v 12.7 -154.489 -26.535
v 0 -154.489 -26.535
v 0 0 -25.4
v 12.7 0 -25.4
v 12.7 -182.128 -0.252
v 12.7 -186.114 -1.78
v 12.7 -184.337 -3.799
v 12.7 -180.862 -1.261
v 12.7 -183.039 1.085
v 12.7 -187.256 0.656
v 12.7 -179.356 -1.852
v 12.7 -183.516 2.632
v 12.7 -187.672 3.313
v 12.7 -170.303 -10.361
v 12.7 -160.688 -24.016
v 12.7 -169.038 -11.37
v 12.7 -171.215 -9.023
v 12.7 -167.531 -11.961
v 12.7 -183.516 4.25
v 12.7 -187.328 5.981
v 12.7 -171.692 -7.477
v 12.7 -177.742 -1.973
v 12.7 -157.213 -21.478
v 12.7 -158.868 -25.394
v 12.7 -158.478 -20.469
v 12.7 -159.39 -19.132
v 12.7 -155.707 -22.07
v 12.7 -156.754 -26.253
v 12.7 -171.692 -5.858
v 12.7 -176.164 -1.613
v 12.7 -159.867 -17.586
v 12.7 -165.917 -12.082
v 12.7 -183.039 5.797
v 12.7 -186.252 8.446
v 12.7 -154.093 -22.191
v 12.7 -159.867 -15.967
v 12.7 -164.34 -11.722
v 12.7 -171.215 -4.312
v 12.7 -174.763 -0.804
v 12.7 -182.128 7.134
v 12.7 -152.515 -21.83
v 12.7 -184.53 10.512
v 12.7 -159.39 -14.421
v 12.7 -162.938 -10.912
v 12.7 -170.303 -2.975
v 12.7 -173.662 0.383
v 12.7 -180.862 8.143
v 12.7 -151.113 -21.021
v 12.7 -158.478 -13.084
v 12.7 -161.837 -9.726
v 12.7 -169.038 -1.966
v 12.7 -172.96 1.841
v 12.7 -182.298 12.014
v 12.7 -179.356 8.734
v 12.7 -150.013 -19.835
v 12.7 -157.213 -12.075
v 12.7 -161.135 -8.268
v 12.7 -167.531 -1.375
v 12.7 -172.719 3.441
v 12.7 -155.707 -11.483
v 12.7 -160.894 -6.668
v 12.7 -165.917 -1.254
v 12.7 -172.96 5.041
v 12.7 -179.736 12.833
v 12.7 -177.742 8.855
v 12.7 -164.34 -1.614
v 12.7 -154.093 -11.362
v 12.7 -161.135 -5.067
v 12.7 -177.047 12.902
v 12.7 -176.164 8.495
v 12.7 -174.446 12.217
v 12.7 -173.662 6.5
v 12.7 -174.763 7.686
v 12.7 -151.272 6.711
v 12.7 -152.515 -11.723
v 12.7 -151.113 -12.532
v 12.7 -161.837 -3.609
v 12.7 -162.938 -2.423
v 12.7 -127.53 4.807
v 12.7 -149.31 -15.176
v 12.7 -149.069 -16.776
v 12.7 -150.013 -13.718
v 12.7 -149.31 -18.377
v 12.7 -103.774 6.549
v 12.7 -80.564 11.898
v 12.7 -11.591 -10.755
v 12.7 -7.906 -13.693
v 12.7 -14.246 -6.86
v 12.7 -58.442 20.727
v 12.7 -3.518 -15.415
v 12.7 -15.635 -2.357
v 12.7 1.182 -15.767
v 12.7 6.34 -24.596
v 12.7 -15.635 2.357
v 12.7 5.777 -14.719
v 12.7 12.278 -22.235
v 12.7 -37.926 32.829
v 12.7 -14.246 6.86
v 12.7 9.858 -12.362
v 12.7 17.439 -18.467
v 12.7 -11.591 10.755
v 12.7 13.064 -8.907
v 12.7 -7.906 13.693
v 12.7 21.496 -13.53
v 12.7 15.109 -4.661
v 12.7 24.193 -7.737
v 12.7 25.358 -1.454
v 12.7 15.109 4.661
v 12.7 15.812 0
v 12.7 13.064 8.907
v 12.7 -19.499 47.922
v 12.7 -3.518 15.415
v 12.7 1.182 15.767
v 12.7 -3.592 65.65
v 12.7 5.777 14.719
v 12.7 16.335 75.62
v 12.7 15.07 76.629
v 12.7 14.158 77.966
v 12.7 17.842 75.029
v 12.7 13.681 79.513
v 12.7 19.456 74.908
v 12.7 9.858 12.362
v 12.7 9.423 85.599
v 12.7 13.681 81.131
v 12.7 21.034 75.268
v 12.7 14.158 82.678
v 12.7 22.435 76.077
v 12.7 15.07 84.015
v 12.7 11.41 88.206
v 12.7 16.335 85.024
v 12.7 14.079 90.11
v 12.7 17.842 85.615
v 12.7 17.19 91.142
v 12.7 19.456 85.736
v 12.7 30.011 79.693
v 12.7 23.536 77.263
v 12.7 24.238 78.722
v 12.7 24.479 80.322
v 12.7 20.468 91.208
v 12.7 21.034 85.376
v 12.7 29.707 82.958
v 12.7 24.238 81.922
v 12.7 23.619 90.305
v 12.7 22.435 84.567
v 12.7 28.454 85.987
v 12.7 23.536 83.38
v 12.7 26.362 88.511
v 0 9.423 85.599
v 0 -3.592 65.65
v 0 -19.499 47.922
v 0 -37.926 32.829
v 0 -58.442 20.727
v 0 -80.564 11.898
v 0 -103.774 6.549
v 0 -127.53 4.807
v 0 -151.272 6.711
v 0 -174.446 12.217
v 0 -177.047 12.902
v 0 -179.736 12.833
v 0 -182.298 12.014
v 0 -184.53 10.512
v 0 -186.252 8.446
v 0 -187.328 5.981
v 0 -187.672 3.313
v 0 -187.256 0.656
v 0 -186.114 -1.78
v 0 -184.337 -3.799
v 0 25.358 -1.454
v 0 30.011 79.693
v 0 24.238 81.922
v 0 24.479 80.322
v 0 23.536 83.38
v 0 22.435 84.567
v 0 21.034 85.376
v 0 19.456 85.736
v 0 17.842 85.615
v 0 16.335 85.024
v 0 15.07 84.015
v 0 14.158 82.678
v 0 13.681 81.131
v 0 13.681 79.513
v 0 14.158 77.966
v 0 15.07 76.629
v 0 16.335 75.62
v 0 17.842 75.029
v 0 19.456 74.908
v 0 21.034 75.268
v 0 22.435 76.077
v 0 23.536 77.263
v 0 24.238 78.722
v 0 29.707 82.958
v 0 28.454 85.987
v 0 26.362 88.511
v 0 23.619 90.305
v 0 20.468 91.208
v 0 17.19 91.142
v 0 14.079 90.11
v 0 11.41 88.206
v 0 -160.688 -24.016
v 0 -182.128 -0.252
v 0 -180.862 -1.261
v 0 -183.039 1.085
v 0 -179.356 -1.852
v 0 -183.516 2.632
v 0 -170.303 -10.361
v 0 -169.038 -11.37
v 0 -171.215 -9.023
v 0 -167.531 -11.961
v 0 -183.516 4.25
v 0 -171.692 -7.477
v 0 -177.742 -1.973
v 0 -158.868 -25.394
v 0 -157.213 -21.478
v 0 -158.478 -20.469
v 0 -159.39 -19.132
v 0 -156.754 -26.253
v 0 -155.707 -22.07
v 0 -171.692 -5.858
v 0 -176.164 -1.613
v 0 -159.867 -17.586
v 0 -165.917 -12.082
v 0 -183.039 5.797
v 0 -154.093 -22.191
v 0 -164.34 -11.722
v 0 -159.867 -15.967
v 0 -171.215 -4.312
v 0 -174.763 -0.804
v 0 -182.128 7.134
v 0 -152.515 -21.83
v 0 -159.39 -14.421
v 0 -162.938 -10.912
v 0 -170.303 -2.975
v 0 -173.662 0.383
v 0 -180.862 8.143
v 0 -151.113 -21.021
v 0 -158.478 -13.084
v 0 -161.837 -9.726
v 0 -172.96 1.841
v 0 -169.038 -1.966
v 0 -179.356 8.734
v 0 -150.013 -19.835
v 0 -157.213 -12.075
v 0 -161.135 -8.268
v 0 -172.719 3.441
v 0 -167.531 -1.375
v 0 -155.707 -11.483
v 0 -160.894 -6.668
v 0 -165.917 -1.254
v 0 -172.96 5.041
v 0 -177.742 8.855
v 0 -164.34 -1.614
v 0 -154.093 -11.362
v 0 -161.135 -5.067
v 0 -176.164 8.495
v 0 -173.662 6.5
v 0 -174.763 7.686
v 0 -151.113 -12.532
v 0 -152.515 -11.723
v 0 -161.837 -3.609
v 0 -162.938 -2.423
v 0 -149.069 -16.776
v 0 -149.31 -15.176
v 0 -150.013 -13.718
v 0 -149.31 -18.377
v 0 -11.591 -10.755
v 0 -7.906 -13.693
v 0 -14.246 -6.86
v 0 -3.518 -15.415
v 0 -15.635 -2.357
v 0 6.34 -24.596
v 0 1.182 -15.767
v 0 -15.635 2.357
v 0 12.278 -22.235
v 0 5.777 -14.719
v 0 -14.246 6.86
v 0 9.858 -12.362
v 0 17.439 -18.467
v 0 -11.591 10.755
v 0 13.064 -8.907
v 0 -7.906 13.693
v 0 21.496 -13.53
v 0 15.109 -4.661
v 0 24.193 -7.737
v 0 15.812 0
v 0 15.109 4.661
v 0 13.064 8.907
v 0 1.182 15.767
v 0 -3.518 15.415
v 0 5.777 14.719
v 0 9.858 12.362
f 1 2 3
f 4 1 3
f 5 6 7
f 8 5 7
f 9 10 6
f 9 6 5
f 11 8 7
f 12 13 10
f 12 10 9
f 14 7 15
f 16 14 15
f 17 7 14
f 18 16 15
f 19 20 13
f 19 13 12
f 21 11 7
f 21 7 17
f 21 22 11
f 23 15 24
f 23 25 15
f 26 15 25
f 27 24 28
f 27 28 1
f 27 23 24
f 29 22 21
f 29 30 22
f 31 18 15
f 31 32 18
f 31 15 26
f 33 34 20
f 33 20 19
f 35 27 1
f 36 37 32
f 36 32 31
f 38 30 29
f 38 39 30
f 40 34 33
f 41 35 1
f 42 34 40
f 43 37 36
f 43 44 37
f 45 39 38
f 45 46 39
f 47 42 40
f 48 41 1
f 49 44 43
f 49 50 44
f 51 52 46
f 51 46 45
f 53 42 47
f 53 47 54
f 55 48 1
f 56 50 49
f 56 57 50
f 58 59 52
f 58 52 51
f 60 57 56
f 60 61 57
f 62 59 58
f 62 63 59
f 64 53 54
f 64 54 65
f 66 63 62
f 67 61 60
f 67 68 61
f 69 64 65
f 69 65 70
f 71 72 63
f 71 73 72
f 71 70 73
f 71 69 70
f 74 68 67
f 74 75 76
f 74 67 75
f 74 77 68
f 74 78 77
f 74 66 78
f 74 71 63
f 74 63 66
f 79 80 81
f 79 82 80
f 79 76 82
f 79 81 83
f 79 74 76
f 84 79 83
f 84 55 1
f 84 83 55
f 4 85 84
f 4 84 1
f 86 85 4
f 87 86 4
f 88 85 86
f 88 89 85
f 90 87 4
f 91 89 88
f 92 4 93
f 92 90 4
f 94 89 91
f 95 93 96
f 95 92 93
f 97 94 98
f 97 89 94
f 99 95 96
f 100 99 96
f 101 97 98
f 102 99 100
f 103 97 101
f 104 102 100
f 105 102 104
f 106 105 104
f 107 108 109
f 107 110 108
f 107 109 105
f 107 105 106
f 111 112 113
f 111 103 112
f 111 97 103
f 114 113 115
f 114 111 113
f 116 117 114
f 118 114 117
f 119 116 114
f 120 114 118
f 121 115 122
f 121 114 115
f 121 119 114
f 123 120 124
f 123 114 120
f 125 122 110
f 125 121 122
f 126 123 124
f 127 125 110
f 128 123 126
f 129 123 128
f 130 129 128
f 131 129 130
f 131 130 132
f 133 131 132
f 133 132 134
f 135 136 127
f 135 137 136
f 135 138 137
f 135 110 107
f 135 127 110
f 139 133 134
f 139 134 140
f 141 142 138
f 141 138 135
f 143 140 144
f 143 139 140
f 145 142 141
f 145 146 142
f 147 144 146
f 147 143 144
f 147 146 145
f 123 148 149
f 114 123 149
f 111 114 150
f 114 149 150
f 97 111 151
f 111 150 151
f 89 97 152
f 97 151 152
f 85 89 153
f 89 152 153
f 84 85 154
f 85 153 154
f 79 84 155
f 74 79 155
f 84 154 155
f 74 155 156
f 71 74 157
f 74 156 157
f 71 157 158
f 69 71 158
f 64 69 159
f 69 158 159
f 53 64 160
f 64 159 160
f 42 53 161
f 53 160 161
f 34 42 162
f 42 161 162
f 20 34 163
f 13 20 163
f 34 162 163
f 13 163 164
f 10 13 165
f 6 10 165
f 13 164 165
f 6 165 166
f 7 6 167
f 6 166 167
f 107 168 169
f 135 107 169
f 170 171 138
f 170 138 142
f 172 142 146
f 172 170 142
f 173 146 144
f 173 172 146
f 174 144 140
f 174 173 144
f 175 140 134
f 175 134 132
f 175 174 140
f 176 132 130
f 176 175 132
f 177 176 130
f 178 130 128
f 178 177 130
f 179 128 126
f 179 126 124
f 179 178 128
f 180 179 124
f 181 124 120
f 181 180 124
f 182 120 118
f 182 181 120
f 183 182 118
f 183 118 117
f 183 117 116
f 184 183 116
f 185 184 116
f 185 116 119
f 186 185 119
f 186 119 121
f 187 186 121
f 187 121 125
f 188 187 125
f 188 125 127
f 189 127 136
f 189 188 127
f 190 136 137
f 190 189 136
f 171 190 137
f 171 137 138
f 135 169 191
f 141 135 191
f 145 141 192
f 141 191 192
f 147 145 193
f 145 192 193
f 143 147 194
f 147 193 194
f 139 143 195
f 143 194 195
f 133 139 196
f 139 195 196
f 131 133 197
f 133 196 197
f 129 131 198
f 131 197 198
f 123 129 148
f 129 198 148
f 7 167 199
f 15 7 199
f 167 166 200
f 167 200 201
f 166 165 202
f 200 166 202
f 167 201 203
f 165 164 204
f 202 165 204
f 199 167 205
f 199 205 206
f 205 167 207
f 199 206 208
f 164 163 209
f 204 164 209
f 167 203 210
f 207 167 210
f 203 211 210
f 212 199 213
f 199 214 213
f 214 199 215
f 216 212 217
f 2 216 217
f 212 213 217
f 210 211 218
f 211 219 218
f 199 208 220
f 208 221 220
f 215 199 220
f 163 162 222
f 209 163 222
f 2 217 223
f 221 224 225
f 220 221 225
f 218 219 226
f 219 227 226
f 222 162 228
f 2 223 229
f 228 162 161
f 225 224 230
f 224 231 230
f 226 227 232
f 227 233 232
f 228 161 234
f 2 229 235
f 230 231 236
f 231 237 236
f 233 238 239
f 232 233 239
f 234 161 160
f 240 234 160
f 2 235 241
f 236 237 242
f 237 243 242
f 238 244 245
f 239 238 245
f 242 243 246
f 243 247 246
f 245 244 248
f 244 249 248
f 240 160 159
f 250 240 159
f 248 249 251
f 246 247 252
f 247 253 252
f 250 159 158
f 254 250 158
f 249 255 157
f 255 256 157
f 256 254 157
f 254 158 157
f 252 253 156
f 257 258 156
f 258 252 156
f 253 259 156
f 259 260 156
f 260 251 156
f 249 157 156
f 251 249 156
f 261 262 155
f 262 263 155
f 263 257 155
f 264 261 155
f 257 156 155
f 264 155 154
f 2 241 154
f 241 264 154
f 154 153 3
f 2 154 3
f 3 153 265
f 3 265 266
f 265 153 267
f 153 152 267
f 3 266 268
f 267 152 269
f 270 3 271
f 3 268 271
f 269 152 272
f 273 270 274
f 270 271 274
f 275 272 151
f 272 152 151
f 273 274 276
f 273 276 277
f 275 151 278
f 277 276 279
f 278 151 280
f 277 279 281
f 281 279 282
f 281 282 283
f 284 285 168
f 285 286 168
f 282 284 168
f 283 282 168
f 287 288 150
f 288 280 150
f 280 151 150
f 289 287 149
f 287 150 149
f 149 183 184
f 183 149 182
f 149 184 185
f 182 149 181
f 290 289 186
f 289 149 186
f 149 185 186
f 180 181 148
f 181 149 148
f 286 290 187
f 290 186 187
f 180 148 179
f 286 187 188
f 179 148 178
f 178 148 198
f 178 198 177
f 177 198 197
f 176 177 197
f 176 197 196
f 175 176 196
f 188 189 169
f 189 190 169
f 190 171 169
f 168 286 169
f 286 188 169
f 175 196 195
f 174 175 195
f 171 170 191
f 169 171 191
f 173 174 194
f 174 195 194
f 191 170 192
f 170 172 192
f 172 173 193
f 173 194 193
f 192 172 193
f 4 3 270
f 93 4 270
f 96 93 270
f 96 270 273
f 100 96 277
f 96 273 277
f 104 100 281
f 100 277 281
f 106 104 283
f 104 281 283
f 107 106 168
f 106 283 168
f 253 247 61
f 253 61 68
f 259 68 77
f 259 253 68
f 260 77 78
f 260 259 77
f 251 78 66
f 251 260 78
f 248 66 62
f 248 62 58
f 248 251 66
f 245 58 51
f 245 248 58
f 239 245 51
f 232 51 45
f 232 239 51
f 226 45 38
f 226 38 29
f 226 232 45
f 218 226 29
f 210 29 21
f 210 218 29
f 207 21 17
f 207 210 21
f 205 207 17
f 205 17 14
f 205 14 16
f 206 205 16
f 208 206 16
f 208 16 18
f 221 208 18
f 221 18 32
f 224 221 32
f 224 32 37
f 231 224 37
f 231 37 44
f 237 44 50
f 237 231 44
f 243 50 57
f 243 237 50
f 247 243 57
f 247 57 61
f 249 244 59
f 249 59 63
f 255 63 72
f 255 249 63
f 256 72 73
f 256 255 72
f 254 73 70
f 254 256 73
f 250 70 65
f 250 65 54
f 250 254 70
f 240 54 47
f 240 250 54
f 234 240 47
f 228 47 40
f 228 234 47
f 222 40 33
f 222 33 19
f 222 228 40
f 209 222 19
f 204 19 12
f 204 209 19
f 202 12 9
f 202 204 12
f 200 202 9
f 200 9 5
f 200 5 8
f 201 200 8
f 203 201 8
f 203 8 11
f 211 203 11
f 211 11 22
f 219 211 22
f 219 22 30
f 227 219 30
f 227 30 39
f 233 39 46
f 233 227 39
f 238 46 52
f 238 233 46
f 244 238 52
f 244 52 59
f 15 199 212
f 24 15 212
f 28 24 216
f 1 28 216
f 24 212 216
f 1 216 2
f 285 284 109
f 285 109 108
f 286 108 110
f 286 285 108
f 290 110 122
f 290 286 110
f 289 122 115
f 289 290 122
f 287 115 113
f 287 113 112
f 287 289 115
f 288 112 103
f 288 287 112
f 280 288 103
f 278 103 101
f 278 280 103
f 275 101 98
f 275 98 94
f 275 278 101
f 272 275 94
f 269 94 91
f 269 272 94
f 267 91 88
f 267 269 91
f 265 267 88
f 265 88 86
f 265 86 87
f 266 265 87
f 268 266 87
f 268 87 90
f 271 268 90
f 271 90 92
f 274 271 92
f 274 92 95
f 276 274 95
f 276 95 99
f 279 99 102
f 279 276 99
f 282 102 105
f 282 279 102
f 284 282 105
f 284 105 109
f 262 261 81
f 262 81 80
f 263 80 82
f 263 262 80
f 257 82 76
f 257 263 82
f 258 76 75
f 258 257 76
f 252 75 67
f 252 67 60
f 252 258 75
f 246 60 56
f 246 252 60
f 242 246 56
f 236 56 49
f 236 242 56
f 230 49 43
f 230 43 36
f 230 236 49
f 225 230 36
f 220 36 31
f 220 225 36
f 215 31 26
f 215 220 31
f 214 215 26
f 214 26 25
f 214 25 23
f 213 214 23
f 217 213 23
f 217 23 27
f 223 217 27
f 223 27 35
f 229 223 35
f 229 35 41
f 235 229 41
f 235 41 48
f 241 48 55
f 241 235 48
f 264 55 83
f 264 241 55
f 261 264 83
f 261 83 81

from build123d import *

# Parameters (mm, degrees)
F0_R     = 5.42925
F0_R_2   = 15.8115
F1_DEPTH = 12.7


with BuildPart() as f1:
    # F0 (on Right) → F1 (new body)
    with BuildSketch(Plane.YZ):
        with BuildLine():
            Line((-154.488795, -26.534761), (0, -25.4))
            ThreePointArc((0, -25.4), (17.438947, -18.467353), (25.358361, -1.45379))
            Line((25.358361, -1.45379), (30.010518, 79.693488))
            ThreePointArc((30.010518, 79.693488), (22.077109, 90.874786), (9.422991, 85.59902))
            ThreePointArc((9.422991, 85.59902), (-69.333406, 15.888309), (-174.446099, 12.217438))
            ThreePointArc((-174.446099, 12.217438), (-186.251925, 8.445986), (-184.337166, -3.798813))
            Line((-184.337166, -3.798813), (-160.687818, -24.016462))
            ThreePointArc((-160.687818, -24.016462), (-157.839108, -25.892982), (-154.488795, -26.534761))
        make_face()
        with Locations((-154.498427, -16.776499)):
            Circle(F0_R, mode=Mode.SUBTRACT)
        with Locations((-166.323101, -6.667674)):
            Circle(F0_R, mode=Mode.SUBTRACT)
        with Locations((-178.147775, 3.441151)):
            Circle(F0_R, mode=Mode.SUBTRACT)
        Circle(F0_R_2, mode=Mode.SUBTRACT)
        with Locations((19.05, 80.321853)):
            Circle(F0_R, mode=Mode.SUBTRACT)
    extrude(amount=F1_DEPTH)


solid = f1.part
